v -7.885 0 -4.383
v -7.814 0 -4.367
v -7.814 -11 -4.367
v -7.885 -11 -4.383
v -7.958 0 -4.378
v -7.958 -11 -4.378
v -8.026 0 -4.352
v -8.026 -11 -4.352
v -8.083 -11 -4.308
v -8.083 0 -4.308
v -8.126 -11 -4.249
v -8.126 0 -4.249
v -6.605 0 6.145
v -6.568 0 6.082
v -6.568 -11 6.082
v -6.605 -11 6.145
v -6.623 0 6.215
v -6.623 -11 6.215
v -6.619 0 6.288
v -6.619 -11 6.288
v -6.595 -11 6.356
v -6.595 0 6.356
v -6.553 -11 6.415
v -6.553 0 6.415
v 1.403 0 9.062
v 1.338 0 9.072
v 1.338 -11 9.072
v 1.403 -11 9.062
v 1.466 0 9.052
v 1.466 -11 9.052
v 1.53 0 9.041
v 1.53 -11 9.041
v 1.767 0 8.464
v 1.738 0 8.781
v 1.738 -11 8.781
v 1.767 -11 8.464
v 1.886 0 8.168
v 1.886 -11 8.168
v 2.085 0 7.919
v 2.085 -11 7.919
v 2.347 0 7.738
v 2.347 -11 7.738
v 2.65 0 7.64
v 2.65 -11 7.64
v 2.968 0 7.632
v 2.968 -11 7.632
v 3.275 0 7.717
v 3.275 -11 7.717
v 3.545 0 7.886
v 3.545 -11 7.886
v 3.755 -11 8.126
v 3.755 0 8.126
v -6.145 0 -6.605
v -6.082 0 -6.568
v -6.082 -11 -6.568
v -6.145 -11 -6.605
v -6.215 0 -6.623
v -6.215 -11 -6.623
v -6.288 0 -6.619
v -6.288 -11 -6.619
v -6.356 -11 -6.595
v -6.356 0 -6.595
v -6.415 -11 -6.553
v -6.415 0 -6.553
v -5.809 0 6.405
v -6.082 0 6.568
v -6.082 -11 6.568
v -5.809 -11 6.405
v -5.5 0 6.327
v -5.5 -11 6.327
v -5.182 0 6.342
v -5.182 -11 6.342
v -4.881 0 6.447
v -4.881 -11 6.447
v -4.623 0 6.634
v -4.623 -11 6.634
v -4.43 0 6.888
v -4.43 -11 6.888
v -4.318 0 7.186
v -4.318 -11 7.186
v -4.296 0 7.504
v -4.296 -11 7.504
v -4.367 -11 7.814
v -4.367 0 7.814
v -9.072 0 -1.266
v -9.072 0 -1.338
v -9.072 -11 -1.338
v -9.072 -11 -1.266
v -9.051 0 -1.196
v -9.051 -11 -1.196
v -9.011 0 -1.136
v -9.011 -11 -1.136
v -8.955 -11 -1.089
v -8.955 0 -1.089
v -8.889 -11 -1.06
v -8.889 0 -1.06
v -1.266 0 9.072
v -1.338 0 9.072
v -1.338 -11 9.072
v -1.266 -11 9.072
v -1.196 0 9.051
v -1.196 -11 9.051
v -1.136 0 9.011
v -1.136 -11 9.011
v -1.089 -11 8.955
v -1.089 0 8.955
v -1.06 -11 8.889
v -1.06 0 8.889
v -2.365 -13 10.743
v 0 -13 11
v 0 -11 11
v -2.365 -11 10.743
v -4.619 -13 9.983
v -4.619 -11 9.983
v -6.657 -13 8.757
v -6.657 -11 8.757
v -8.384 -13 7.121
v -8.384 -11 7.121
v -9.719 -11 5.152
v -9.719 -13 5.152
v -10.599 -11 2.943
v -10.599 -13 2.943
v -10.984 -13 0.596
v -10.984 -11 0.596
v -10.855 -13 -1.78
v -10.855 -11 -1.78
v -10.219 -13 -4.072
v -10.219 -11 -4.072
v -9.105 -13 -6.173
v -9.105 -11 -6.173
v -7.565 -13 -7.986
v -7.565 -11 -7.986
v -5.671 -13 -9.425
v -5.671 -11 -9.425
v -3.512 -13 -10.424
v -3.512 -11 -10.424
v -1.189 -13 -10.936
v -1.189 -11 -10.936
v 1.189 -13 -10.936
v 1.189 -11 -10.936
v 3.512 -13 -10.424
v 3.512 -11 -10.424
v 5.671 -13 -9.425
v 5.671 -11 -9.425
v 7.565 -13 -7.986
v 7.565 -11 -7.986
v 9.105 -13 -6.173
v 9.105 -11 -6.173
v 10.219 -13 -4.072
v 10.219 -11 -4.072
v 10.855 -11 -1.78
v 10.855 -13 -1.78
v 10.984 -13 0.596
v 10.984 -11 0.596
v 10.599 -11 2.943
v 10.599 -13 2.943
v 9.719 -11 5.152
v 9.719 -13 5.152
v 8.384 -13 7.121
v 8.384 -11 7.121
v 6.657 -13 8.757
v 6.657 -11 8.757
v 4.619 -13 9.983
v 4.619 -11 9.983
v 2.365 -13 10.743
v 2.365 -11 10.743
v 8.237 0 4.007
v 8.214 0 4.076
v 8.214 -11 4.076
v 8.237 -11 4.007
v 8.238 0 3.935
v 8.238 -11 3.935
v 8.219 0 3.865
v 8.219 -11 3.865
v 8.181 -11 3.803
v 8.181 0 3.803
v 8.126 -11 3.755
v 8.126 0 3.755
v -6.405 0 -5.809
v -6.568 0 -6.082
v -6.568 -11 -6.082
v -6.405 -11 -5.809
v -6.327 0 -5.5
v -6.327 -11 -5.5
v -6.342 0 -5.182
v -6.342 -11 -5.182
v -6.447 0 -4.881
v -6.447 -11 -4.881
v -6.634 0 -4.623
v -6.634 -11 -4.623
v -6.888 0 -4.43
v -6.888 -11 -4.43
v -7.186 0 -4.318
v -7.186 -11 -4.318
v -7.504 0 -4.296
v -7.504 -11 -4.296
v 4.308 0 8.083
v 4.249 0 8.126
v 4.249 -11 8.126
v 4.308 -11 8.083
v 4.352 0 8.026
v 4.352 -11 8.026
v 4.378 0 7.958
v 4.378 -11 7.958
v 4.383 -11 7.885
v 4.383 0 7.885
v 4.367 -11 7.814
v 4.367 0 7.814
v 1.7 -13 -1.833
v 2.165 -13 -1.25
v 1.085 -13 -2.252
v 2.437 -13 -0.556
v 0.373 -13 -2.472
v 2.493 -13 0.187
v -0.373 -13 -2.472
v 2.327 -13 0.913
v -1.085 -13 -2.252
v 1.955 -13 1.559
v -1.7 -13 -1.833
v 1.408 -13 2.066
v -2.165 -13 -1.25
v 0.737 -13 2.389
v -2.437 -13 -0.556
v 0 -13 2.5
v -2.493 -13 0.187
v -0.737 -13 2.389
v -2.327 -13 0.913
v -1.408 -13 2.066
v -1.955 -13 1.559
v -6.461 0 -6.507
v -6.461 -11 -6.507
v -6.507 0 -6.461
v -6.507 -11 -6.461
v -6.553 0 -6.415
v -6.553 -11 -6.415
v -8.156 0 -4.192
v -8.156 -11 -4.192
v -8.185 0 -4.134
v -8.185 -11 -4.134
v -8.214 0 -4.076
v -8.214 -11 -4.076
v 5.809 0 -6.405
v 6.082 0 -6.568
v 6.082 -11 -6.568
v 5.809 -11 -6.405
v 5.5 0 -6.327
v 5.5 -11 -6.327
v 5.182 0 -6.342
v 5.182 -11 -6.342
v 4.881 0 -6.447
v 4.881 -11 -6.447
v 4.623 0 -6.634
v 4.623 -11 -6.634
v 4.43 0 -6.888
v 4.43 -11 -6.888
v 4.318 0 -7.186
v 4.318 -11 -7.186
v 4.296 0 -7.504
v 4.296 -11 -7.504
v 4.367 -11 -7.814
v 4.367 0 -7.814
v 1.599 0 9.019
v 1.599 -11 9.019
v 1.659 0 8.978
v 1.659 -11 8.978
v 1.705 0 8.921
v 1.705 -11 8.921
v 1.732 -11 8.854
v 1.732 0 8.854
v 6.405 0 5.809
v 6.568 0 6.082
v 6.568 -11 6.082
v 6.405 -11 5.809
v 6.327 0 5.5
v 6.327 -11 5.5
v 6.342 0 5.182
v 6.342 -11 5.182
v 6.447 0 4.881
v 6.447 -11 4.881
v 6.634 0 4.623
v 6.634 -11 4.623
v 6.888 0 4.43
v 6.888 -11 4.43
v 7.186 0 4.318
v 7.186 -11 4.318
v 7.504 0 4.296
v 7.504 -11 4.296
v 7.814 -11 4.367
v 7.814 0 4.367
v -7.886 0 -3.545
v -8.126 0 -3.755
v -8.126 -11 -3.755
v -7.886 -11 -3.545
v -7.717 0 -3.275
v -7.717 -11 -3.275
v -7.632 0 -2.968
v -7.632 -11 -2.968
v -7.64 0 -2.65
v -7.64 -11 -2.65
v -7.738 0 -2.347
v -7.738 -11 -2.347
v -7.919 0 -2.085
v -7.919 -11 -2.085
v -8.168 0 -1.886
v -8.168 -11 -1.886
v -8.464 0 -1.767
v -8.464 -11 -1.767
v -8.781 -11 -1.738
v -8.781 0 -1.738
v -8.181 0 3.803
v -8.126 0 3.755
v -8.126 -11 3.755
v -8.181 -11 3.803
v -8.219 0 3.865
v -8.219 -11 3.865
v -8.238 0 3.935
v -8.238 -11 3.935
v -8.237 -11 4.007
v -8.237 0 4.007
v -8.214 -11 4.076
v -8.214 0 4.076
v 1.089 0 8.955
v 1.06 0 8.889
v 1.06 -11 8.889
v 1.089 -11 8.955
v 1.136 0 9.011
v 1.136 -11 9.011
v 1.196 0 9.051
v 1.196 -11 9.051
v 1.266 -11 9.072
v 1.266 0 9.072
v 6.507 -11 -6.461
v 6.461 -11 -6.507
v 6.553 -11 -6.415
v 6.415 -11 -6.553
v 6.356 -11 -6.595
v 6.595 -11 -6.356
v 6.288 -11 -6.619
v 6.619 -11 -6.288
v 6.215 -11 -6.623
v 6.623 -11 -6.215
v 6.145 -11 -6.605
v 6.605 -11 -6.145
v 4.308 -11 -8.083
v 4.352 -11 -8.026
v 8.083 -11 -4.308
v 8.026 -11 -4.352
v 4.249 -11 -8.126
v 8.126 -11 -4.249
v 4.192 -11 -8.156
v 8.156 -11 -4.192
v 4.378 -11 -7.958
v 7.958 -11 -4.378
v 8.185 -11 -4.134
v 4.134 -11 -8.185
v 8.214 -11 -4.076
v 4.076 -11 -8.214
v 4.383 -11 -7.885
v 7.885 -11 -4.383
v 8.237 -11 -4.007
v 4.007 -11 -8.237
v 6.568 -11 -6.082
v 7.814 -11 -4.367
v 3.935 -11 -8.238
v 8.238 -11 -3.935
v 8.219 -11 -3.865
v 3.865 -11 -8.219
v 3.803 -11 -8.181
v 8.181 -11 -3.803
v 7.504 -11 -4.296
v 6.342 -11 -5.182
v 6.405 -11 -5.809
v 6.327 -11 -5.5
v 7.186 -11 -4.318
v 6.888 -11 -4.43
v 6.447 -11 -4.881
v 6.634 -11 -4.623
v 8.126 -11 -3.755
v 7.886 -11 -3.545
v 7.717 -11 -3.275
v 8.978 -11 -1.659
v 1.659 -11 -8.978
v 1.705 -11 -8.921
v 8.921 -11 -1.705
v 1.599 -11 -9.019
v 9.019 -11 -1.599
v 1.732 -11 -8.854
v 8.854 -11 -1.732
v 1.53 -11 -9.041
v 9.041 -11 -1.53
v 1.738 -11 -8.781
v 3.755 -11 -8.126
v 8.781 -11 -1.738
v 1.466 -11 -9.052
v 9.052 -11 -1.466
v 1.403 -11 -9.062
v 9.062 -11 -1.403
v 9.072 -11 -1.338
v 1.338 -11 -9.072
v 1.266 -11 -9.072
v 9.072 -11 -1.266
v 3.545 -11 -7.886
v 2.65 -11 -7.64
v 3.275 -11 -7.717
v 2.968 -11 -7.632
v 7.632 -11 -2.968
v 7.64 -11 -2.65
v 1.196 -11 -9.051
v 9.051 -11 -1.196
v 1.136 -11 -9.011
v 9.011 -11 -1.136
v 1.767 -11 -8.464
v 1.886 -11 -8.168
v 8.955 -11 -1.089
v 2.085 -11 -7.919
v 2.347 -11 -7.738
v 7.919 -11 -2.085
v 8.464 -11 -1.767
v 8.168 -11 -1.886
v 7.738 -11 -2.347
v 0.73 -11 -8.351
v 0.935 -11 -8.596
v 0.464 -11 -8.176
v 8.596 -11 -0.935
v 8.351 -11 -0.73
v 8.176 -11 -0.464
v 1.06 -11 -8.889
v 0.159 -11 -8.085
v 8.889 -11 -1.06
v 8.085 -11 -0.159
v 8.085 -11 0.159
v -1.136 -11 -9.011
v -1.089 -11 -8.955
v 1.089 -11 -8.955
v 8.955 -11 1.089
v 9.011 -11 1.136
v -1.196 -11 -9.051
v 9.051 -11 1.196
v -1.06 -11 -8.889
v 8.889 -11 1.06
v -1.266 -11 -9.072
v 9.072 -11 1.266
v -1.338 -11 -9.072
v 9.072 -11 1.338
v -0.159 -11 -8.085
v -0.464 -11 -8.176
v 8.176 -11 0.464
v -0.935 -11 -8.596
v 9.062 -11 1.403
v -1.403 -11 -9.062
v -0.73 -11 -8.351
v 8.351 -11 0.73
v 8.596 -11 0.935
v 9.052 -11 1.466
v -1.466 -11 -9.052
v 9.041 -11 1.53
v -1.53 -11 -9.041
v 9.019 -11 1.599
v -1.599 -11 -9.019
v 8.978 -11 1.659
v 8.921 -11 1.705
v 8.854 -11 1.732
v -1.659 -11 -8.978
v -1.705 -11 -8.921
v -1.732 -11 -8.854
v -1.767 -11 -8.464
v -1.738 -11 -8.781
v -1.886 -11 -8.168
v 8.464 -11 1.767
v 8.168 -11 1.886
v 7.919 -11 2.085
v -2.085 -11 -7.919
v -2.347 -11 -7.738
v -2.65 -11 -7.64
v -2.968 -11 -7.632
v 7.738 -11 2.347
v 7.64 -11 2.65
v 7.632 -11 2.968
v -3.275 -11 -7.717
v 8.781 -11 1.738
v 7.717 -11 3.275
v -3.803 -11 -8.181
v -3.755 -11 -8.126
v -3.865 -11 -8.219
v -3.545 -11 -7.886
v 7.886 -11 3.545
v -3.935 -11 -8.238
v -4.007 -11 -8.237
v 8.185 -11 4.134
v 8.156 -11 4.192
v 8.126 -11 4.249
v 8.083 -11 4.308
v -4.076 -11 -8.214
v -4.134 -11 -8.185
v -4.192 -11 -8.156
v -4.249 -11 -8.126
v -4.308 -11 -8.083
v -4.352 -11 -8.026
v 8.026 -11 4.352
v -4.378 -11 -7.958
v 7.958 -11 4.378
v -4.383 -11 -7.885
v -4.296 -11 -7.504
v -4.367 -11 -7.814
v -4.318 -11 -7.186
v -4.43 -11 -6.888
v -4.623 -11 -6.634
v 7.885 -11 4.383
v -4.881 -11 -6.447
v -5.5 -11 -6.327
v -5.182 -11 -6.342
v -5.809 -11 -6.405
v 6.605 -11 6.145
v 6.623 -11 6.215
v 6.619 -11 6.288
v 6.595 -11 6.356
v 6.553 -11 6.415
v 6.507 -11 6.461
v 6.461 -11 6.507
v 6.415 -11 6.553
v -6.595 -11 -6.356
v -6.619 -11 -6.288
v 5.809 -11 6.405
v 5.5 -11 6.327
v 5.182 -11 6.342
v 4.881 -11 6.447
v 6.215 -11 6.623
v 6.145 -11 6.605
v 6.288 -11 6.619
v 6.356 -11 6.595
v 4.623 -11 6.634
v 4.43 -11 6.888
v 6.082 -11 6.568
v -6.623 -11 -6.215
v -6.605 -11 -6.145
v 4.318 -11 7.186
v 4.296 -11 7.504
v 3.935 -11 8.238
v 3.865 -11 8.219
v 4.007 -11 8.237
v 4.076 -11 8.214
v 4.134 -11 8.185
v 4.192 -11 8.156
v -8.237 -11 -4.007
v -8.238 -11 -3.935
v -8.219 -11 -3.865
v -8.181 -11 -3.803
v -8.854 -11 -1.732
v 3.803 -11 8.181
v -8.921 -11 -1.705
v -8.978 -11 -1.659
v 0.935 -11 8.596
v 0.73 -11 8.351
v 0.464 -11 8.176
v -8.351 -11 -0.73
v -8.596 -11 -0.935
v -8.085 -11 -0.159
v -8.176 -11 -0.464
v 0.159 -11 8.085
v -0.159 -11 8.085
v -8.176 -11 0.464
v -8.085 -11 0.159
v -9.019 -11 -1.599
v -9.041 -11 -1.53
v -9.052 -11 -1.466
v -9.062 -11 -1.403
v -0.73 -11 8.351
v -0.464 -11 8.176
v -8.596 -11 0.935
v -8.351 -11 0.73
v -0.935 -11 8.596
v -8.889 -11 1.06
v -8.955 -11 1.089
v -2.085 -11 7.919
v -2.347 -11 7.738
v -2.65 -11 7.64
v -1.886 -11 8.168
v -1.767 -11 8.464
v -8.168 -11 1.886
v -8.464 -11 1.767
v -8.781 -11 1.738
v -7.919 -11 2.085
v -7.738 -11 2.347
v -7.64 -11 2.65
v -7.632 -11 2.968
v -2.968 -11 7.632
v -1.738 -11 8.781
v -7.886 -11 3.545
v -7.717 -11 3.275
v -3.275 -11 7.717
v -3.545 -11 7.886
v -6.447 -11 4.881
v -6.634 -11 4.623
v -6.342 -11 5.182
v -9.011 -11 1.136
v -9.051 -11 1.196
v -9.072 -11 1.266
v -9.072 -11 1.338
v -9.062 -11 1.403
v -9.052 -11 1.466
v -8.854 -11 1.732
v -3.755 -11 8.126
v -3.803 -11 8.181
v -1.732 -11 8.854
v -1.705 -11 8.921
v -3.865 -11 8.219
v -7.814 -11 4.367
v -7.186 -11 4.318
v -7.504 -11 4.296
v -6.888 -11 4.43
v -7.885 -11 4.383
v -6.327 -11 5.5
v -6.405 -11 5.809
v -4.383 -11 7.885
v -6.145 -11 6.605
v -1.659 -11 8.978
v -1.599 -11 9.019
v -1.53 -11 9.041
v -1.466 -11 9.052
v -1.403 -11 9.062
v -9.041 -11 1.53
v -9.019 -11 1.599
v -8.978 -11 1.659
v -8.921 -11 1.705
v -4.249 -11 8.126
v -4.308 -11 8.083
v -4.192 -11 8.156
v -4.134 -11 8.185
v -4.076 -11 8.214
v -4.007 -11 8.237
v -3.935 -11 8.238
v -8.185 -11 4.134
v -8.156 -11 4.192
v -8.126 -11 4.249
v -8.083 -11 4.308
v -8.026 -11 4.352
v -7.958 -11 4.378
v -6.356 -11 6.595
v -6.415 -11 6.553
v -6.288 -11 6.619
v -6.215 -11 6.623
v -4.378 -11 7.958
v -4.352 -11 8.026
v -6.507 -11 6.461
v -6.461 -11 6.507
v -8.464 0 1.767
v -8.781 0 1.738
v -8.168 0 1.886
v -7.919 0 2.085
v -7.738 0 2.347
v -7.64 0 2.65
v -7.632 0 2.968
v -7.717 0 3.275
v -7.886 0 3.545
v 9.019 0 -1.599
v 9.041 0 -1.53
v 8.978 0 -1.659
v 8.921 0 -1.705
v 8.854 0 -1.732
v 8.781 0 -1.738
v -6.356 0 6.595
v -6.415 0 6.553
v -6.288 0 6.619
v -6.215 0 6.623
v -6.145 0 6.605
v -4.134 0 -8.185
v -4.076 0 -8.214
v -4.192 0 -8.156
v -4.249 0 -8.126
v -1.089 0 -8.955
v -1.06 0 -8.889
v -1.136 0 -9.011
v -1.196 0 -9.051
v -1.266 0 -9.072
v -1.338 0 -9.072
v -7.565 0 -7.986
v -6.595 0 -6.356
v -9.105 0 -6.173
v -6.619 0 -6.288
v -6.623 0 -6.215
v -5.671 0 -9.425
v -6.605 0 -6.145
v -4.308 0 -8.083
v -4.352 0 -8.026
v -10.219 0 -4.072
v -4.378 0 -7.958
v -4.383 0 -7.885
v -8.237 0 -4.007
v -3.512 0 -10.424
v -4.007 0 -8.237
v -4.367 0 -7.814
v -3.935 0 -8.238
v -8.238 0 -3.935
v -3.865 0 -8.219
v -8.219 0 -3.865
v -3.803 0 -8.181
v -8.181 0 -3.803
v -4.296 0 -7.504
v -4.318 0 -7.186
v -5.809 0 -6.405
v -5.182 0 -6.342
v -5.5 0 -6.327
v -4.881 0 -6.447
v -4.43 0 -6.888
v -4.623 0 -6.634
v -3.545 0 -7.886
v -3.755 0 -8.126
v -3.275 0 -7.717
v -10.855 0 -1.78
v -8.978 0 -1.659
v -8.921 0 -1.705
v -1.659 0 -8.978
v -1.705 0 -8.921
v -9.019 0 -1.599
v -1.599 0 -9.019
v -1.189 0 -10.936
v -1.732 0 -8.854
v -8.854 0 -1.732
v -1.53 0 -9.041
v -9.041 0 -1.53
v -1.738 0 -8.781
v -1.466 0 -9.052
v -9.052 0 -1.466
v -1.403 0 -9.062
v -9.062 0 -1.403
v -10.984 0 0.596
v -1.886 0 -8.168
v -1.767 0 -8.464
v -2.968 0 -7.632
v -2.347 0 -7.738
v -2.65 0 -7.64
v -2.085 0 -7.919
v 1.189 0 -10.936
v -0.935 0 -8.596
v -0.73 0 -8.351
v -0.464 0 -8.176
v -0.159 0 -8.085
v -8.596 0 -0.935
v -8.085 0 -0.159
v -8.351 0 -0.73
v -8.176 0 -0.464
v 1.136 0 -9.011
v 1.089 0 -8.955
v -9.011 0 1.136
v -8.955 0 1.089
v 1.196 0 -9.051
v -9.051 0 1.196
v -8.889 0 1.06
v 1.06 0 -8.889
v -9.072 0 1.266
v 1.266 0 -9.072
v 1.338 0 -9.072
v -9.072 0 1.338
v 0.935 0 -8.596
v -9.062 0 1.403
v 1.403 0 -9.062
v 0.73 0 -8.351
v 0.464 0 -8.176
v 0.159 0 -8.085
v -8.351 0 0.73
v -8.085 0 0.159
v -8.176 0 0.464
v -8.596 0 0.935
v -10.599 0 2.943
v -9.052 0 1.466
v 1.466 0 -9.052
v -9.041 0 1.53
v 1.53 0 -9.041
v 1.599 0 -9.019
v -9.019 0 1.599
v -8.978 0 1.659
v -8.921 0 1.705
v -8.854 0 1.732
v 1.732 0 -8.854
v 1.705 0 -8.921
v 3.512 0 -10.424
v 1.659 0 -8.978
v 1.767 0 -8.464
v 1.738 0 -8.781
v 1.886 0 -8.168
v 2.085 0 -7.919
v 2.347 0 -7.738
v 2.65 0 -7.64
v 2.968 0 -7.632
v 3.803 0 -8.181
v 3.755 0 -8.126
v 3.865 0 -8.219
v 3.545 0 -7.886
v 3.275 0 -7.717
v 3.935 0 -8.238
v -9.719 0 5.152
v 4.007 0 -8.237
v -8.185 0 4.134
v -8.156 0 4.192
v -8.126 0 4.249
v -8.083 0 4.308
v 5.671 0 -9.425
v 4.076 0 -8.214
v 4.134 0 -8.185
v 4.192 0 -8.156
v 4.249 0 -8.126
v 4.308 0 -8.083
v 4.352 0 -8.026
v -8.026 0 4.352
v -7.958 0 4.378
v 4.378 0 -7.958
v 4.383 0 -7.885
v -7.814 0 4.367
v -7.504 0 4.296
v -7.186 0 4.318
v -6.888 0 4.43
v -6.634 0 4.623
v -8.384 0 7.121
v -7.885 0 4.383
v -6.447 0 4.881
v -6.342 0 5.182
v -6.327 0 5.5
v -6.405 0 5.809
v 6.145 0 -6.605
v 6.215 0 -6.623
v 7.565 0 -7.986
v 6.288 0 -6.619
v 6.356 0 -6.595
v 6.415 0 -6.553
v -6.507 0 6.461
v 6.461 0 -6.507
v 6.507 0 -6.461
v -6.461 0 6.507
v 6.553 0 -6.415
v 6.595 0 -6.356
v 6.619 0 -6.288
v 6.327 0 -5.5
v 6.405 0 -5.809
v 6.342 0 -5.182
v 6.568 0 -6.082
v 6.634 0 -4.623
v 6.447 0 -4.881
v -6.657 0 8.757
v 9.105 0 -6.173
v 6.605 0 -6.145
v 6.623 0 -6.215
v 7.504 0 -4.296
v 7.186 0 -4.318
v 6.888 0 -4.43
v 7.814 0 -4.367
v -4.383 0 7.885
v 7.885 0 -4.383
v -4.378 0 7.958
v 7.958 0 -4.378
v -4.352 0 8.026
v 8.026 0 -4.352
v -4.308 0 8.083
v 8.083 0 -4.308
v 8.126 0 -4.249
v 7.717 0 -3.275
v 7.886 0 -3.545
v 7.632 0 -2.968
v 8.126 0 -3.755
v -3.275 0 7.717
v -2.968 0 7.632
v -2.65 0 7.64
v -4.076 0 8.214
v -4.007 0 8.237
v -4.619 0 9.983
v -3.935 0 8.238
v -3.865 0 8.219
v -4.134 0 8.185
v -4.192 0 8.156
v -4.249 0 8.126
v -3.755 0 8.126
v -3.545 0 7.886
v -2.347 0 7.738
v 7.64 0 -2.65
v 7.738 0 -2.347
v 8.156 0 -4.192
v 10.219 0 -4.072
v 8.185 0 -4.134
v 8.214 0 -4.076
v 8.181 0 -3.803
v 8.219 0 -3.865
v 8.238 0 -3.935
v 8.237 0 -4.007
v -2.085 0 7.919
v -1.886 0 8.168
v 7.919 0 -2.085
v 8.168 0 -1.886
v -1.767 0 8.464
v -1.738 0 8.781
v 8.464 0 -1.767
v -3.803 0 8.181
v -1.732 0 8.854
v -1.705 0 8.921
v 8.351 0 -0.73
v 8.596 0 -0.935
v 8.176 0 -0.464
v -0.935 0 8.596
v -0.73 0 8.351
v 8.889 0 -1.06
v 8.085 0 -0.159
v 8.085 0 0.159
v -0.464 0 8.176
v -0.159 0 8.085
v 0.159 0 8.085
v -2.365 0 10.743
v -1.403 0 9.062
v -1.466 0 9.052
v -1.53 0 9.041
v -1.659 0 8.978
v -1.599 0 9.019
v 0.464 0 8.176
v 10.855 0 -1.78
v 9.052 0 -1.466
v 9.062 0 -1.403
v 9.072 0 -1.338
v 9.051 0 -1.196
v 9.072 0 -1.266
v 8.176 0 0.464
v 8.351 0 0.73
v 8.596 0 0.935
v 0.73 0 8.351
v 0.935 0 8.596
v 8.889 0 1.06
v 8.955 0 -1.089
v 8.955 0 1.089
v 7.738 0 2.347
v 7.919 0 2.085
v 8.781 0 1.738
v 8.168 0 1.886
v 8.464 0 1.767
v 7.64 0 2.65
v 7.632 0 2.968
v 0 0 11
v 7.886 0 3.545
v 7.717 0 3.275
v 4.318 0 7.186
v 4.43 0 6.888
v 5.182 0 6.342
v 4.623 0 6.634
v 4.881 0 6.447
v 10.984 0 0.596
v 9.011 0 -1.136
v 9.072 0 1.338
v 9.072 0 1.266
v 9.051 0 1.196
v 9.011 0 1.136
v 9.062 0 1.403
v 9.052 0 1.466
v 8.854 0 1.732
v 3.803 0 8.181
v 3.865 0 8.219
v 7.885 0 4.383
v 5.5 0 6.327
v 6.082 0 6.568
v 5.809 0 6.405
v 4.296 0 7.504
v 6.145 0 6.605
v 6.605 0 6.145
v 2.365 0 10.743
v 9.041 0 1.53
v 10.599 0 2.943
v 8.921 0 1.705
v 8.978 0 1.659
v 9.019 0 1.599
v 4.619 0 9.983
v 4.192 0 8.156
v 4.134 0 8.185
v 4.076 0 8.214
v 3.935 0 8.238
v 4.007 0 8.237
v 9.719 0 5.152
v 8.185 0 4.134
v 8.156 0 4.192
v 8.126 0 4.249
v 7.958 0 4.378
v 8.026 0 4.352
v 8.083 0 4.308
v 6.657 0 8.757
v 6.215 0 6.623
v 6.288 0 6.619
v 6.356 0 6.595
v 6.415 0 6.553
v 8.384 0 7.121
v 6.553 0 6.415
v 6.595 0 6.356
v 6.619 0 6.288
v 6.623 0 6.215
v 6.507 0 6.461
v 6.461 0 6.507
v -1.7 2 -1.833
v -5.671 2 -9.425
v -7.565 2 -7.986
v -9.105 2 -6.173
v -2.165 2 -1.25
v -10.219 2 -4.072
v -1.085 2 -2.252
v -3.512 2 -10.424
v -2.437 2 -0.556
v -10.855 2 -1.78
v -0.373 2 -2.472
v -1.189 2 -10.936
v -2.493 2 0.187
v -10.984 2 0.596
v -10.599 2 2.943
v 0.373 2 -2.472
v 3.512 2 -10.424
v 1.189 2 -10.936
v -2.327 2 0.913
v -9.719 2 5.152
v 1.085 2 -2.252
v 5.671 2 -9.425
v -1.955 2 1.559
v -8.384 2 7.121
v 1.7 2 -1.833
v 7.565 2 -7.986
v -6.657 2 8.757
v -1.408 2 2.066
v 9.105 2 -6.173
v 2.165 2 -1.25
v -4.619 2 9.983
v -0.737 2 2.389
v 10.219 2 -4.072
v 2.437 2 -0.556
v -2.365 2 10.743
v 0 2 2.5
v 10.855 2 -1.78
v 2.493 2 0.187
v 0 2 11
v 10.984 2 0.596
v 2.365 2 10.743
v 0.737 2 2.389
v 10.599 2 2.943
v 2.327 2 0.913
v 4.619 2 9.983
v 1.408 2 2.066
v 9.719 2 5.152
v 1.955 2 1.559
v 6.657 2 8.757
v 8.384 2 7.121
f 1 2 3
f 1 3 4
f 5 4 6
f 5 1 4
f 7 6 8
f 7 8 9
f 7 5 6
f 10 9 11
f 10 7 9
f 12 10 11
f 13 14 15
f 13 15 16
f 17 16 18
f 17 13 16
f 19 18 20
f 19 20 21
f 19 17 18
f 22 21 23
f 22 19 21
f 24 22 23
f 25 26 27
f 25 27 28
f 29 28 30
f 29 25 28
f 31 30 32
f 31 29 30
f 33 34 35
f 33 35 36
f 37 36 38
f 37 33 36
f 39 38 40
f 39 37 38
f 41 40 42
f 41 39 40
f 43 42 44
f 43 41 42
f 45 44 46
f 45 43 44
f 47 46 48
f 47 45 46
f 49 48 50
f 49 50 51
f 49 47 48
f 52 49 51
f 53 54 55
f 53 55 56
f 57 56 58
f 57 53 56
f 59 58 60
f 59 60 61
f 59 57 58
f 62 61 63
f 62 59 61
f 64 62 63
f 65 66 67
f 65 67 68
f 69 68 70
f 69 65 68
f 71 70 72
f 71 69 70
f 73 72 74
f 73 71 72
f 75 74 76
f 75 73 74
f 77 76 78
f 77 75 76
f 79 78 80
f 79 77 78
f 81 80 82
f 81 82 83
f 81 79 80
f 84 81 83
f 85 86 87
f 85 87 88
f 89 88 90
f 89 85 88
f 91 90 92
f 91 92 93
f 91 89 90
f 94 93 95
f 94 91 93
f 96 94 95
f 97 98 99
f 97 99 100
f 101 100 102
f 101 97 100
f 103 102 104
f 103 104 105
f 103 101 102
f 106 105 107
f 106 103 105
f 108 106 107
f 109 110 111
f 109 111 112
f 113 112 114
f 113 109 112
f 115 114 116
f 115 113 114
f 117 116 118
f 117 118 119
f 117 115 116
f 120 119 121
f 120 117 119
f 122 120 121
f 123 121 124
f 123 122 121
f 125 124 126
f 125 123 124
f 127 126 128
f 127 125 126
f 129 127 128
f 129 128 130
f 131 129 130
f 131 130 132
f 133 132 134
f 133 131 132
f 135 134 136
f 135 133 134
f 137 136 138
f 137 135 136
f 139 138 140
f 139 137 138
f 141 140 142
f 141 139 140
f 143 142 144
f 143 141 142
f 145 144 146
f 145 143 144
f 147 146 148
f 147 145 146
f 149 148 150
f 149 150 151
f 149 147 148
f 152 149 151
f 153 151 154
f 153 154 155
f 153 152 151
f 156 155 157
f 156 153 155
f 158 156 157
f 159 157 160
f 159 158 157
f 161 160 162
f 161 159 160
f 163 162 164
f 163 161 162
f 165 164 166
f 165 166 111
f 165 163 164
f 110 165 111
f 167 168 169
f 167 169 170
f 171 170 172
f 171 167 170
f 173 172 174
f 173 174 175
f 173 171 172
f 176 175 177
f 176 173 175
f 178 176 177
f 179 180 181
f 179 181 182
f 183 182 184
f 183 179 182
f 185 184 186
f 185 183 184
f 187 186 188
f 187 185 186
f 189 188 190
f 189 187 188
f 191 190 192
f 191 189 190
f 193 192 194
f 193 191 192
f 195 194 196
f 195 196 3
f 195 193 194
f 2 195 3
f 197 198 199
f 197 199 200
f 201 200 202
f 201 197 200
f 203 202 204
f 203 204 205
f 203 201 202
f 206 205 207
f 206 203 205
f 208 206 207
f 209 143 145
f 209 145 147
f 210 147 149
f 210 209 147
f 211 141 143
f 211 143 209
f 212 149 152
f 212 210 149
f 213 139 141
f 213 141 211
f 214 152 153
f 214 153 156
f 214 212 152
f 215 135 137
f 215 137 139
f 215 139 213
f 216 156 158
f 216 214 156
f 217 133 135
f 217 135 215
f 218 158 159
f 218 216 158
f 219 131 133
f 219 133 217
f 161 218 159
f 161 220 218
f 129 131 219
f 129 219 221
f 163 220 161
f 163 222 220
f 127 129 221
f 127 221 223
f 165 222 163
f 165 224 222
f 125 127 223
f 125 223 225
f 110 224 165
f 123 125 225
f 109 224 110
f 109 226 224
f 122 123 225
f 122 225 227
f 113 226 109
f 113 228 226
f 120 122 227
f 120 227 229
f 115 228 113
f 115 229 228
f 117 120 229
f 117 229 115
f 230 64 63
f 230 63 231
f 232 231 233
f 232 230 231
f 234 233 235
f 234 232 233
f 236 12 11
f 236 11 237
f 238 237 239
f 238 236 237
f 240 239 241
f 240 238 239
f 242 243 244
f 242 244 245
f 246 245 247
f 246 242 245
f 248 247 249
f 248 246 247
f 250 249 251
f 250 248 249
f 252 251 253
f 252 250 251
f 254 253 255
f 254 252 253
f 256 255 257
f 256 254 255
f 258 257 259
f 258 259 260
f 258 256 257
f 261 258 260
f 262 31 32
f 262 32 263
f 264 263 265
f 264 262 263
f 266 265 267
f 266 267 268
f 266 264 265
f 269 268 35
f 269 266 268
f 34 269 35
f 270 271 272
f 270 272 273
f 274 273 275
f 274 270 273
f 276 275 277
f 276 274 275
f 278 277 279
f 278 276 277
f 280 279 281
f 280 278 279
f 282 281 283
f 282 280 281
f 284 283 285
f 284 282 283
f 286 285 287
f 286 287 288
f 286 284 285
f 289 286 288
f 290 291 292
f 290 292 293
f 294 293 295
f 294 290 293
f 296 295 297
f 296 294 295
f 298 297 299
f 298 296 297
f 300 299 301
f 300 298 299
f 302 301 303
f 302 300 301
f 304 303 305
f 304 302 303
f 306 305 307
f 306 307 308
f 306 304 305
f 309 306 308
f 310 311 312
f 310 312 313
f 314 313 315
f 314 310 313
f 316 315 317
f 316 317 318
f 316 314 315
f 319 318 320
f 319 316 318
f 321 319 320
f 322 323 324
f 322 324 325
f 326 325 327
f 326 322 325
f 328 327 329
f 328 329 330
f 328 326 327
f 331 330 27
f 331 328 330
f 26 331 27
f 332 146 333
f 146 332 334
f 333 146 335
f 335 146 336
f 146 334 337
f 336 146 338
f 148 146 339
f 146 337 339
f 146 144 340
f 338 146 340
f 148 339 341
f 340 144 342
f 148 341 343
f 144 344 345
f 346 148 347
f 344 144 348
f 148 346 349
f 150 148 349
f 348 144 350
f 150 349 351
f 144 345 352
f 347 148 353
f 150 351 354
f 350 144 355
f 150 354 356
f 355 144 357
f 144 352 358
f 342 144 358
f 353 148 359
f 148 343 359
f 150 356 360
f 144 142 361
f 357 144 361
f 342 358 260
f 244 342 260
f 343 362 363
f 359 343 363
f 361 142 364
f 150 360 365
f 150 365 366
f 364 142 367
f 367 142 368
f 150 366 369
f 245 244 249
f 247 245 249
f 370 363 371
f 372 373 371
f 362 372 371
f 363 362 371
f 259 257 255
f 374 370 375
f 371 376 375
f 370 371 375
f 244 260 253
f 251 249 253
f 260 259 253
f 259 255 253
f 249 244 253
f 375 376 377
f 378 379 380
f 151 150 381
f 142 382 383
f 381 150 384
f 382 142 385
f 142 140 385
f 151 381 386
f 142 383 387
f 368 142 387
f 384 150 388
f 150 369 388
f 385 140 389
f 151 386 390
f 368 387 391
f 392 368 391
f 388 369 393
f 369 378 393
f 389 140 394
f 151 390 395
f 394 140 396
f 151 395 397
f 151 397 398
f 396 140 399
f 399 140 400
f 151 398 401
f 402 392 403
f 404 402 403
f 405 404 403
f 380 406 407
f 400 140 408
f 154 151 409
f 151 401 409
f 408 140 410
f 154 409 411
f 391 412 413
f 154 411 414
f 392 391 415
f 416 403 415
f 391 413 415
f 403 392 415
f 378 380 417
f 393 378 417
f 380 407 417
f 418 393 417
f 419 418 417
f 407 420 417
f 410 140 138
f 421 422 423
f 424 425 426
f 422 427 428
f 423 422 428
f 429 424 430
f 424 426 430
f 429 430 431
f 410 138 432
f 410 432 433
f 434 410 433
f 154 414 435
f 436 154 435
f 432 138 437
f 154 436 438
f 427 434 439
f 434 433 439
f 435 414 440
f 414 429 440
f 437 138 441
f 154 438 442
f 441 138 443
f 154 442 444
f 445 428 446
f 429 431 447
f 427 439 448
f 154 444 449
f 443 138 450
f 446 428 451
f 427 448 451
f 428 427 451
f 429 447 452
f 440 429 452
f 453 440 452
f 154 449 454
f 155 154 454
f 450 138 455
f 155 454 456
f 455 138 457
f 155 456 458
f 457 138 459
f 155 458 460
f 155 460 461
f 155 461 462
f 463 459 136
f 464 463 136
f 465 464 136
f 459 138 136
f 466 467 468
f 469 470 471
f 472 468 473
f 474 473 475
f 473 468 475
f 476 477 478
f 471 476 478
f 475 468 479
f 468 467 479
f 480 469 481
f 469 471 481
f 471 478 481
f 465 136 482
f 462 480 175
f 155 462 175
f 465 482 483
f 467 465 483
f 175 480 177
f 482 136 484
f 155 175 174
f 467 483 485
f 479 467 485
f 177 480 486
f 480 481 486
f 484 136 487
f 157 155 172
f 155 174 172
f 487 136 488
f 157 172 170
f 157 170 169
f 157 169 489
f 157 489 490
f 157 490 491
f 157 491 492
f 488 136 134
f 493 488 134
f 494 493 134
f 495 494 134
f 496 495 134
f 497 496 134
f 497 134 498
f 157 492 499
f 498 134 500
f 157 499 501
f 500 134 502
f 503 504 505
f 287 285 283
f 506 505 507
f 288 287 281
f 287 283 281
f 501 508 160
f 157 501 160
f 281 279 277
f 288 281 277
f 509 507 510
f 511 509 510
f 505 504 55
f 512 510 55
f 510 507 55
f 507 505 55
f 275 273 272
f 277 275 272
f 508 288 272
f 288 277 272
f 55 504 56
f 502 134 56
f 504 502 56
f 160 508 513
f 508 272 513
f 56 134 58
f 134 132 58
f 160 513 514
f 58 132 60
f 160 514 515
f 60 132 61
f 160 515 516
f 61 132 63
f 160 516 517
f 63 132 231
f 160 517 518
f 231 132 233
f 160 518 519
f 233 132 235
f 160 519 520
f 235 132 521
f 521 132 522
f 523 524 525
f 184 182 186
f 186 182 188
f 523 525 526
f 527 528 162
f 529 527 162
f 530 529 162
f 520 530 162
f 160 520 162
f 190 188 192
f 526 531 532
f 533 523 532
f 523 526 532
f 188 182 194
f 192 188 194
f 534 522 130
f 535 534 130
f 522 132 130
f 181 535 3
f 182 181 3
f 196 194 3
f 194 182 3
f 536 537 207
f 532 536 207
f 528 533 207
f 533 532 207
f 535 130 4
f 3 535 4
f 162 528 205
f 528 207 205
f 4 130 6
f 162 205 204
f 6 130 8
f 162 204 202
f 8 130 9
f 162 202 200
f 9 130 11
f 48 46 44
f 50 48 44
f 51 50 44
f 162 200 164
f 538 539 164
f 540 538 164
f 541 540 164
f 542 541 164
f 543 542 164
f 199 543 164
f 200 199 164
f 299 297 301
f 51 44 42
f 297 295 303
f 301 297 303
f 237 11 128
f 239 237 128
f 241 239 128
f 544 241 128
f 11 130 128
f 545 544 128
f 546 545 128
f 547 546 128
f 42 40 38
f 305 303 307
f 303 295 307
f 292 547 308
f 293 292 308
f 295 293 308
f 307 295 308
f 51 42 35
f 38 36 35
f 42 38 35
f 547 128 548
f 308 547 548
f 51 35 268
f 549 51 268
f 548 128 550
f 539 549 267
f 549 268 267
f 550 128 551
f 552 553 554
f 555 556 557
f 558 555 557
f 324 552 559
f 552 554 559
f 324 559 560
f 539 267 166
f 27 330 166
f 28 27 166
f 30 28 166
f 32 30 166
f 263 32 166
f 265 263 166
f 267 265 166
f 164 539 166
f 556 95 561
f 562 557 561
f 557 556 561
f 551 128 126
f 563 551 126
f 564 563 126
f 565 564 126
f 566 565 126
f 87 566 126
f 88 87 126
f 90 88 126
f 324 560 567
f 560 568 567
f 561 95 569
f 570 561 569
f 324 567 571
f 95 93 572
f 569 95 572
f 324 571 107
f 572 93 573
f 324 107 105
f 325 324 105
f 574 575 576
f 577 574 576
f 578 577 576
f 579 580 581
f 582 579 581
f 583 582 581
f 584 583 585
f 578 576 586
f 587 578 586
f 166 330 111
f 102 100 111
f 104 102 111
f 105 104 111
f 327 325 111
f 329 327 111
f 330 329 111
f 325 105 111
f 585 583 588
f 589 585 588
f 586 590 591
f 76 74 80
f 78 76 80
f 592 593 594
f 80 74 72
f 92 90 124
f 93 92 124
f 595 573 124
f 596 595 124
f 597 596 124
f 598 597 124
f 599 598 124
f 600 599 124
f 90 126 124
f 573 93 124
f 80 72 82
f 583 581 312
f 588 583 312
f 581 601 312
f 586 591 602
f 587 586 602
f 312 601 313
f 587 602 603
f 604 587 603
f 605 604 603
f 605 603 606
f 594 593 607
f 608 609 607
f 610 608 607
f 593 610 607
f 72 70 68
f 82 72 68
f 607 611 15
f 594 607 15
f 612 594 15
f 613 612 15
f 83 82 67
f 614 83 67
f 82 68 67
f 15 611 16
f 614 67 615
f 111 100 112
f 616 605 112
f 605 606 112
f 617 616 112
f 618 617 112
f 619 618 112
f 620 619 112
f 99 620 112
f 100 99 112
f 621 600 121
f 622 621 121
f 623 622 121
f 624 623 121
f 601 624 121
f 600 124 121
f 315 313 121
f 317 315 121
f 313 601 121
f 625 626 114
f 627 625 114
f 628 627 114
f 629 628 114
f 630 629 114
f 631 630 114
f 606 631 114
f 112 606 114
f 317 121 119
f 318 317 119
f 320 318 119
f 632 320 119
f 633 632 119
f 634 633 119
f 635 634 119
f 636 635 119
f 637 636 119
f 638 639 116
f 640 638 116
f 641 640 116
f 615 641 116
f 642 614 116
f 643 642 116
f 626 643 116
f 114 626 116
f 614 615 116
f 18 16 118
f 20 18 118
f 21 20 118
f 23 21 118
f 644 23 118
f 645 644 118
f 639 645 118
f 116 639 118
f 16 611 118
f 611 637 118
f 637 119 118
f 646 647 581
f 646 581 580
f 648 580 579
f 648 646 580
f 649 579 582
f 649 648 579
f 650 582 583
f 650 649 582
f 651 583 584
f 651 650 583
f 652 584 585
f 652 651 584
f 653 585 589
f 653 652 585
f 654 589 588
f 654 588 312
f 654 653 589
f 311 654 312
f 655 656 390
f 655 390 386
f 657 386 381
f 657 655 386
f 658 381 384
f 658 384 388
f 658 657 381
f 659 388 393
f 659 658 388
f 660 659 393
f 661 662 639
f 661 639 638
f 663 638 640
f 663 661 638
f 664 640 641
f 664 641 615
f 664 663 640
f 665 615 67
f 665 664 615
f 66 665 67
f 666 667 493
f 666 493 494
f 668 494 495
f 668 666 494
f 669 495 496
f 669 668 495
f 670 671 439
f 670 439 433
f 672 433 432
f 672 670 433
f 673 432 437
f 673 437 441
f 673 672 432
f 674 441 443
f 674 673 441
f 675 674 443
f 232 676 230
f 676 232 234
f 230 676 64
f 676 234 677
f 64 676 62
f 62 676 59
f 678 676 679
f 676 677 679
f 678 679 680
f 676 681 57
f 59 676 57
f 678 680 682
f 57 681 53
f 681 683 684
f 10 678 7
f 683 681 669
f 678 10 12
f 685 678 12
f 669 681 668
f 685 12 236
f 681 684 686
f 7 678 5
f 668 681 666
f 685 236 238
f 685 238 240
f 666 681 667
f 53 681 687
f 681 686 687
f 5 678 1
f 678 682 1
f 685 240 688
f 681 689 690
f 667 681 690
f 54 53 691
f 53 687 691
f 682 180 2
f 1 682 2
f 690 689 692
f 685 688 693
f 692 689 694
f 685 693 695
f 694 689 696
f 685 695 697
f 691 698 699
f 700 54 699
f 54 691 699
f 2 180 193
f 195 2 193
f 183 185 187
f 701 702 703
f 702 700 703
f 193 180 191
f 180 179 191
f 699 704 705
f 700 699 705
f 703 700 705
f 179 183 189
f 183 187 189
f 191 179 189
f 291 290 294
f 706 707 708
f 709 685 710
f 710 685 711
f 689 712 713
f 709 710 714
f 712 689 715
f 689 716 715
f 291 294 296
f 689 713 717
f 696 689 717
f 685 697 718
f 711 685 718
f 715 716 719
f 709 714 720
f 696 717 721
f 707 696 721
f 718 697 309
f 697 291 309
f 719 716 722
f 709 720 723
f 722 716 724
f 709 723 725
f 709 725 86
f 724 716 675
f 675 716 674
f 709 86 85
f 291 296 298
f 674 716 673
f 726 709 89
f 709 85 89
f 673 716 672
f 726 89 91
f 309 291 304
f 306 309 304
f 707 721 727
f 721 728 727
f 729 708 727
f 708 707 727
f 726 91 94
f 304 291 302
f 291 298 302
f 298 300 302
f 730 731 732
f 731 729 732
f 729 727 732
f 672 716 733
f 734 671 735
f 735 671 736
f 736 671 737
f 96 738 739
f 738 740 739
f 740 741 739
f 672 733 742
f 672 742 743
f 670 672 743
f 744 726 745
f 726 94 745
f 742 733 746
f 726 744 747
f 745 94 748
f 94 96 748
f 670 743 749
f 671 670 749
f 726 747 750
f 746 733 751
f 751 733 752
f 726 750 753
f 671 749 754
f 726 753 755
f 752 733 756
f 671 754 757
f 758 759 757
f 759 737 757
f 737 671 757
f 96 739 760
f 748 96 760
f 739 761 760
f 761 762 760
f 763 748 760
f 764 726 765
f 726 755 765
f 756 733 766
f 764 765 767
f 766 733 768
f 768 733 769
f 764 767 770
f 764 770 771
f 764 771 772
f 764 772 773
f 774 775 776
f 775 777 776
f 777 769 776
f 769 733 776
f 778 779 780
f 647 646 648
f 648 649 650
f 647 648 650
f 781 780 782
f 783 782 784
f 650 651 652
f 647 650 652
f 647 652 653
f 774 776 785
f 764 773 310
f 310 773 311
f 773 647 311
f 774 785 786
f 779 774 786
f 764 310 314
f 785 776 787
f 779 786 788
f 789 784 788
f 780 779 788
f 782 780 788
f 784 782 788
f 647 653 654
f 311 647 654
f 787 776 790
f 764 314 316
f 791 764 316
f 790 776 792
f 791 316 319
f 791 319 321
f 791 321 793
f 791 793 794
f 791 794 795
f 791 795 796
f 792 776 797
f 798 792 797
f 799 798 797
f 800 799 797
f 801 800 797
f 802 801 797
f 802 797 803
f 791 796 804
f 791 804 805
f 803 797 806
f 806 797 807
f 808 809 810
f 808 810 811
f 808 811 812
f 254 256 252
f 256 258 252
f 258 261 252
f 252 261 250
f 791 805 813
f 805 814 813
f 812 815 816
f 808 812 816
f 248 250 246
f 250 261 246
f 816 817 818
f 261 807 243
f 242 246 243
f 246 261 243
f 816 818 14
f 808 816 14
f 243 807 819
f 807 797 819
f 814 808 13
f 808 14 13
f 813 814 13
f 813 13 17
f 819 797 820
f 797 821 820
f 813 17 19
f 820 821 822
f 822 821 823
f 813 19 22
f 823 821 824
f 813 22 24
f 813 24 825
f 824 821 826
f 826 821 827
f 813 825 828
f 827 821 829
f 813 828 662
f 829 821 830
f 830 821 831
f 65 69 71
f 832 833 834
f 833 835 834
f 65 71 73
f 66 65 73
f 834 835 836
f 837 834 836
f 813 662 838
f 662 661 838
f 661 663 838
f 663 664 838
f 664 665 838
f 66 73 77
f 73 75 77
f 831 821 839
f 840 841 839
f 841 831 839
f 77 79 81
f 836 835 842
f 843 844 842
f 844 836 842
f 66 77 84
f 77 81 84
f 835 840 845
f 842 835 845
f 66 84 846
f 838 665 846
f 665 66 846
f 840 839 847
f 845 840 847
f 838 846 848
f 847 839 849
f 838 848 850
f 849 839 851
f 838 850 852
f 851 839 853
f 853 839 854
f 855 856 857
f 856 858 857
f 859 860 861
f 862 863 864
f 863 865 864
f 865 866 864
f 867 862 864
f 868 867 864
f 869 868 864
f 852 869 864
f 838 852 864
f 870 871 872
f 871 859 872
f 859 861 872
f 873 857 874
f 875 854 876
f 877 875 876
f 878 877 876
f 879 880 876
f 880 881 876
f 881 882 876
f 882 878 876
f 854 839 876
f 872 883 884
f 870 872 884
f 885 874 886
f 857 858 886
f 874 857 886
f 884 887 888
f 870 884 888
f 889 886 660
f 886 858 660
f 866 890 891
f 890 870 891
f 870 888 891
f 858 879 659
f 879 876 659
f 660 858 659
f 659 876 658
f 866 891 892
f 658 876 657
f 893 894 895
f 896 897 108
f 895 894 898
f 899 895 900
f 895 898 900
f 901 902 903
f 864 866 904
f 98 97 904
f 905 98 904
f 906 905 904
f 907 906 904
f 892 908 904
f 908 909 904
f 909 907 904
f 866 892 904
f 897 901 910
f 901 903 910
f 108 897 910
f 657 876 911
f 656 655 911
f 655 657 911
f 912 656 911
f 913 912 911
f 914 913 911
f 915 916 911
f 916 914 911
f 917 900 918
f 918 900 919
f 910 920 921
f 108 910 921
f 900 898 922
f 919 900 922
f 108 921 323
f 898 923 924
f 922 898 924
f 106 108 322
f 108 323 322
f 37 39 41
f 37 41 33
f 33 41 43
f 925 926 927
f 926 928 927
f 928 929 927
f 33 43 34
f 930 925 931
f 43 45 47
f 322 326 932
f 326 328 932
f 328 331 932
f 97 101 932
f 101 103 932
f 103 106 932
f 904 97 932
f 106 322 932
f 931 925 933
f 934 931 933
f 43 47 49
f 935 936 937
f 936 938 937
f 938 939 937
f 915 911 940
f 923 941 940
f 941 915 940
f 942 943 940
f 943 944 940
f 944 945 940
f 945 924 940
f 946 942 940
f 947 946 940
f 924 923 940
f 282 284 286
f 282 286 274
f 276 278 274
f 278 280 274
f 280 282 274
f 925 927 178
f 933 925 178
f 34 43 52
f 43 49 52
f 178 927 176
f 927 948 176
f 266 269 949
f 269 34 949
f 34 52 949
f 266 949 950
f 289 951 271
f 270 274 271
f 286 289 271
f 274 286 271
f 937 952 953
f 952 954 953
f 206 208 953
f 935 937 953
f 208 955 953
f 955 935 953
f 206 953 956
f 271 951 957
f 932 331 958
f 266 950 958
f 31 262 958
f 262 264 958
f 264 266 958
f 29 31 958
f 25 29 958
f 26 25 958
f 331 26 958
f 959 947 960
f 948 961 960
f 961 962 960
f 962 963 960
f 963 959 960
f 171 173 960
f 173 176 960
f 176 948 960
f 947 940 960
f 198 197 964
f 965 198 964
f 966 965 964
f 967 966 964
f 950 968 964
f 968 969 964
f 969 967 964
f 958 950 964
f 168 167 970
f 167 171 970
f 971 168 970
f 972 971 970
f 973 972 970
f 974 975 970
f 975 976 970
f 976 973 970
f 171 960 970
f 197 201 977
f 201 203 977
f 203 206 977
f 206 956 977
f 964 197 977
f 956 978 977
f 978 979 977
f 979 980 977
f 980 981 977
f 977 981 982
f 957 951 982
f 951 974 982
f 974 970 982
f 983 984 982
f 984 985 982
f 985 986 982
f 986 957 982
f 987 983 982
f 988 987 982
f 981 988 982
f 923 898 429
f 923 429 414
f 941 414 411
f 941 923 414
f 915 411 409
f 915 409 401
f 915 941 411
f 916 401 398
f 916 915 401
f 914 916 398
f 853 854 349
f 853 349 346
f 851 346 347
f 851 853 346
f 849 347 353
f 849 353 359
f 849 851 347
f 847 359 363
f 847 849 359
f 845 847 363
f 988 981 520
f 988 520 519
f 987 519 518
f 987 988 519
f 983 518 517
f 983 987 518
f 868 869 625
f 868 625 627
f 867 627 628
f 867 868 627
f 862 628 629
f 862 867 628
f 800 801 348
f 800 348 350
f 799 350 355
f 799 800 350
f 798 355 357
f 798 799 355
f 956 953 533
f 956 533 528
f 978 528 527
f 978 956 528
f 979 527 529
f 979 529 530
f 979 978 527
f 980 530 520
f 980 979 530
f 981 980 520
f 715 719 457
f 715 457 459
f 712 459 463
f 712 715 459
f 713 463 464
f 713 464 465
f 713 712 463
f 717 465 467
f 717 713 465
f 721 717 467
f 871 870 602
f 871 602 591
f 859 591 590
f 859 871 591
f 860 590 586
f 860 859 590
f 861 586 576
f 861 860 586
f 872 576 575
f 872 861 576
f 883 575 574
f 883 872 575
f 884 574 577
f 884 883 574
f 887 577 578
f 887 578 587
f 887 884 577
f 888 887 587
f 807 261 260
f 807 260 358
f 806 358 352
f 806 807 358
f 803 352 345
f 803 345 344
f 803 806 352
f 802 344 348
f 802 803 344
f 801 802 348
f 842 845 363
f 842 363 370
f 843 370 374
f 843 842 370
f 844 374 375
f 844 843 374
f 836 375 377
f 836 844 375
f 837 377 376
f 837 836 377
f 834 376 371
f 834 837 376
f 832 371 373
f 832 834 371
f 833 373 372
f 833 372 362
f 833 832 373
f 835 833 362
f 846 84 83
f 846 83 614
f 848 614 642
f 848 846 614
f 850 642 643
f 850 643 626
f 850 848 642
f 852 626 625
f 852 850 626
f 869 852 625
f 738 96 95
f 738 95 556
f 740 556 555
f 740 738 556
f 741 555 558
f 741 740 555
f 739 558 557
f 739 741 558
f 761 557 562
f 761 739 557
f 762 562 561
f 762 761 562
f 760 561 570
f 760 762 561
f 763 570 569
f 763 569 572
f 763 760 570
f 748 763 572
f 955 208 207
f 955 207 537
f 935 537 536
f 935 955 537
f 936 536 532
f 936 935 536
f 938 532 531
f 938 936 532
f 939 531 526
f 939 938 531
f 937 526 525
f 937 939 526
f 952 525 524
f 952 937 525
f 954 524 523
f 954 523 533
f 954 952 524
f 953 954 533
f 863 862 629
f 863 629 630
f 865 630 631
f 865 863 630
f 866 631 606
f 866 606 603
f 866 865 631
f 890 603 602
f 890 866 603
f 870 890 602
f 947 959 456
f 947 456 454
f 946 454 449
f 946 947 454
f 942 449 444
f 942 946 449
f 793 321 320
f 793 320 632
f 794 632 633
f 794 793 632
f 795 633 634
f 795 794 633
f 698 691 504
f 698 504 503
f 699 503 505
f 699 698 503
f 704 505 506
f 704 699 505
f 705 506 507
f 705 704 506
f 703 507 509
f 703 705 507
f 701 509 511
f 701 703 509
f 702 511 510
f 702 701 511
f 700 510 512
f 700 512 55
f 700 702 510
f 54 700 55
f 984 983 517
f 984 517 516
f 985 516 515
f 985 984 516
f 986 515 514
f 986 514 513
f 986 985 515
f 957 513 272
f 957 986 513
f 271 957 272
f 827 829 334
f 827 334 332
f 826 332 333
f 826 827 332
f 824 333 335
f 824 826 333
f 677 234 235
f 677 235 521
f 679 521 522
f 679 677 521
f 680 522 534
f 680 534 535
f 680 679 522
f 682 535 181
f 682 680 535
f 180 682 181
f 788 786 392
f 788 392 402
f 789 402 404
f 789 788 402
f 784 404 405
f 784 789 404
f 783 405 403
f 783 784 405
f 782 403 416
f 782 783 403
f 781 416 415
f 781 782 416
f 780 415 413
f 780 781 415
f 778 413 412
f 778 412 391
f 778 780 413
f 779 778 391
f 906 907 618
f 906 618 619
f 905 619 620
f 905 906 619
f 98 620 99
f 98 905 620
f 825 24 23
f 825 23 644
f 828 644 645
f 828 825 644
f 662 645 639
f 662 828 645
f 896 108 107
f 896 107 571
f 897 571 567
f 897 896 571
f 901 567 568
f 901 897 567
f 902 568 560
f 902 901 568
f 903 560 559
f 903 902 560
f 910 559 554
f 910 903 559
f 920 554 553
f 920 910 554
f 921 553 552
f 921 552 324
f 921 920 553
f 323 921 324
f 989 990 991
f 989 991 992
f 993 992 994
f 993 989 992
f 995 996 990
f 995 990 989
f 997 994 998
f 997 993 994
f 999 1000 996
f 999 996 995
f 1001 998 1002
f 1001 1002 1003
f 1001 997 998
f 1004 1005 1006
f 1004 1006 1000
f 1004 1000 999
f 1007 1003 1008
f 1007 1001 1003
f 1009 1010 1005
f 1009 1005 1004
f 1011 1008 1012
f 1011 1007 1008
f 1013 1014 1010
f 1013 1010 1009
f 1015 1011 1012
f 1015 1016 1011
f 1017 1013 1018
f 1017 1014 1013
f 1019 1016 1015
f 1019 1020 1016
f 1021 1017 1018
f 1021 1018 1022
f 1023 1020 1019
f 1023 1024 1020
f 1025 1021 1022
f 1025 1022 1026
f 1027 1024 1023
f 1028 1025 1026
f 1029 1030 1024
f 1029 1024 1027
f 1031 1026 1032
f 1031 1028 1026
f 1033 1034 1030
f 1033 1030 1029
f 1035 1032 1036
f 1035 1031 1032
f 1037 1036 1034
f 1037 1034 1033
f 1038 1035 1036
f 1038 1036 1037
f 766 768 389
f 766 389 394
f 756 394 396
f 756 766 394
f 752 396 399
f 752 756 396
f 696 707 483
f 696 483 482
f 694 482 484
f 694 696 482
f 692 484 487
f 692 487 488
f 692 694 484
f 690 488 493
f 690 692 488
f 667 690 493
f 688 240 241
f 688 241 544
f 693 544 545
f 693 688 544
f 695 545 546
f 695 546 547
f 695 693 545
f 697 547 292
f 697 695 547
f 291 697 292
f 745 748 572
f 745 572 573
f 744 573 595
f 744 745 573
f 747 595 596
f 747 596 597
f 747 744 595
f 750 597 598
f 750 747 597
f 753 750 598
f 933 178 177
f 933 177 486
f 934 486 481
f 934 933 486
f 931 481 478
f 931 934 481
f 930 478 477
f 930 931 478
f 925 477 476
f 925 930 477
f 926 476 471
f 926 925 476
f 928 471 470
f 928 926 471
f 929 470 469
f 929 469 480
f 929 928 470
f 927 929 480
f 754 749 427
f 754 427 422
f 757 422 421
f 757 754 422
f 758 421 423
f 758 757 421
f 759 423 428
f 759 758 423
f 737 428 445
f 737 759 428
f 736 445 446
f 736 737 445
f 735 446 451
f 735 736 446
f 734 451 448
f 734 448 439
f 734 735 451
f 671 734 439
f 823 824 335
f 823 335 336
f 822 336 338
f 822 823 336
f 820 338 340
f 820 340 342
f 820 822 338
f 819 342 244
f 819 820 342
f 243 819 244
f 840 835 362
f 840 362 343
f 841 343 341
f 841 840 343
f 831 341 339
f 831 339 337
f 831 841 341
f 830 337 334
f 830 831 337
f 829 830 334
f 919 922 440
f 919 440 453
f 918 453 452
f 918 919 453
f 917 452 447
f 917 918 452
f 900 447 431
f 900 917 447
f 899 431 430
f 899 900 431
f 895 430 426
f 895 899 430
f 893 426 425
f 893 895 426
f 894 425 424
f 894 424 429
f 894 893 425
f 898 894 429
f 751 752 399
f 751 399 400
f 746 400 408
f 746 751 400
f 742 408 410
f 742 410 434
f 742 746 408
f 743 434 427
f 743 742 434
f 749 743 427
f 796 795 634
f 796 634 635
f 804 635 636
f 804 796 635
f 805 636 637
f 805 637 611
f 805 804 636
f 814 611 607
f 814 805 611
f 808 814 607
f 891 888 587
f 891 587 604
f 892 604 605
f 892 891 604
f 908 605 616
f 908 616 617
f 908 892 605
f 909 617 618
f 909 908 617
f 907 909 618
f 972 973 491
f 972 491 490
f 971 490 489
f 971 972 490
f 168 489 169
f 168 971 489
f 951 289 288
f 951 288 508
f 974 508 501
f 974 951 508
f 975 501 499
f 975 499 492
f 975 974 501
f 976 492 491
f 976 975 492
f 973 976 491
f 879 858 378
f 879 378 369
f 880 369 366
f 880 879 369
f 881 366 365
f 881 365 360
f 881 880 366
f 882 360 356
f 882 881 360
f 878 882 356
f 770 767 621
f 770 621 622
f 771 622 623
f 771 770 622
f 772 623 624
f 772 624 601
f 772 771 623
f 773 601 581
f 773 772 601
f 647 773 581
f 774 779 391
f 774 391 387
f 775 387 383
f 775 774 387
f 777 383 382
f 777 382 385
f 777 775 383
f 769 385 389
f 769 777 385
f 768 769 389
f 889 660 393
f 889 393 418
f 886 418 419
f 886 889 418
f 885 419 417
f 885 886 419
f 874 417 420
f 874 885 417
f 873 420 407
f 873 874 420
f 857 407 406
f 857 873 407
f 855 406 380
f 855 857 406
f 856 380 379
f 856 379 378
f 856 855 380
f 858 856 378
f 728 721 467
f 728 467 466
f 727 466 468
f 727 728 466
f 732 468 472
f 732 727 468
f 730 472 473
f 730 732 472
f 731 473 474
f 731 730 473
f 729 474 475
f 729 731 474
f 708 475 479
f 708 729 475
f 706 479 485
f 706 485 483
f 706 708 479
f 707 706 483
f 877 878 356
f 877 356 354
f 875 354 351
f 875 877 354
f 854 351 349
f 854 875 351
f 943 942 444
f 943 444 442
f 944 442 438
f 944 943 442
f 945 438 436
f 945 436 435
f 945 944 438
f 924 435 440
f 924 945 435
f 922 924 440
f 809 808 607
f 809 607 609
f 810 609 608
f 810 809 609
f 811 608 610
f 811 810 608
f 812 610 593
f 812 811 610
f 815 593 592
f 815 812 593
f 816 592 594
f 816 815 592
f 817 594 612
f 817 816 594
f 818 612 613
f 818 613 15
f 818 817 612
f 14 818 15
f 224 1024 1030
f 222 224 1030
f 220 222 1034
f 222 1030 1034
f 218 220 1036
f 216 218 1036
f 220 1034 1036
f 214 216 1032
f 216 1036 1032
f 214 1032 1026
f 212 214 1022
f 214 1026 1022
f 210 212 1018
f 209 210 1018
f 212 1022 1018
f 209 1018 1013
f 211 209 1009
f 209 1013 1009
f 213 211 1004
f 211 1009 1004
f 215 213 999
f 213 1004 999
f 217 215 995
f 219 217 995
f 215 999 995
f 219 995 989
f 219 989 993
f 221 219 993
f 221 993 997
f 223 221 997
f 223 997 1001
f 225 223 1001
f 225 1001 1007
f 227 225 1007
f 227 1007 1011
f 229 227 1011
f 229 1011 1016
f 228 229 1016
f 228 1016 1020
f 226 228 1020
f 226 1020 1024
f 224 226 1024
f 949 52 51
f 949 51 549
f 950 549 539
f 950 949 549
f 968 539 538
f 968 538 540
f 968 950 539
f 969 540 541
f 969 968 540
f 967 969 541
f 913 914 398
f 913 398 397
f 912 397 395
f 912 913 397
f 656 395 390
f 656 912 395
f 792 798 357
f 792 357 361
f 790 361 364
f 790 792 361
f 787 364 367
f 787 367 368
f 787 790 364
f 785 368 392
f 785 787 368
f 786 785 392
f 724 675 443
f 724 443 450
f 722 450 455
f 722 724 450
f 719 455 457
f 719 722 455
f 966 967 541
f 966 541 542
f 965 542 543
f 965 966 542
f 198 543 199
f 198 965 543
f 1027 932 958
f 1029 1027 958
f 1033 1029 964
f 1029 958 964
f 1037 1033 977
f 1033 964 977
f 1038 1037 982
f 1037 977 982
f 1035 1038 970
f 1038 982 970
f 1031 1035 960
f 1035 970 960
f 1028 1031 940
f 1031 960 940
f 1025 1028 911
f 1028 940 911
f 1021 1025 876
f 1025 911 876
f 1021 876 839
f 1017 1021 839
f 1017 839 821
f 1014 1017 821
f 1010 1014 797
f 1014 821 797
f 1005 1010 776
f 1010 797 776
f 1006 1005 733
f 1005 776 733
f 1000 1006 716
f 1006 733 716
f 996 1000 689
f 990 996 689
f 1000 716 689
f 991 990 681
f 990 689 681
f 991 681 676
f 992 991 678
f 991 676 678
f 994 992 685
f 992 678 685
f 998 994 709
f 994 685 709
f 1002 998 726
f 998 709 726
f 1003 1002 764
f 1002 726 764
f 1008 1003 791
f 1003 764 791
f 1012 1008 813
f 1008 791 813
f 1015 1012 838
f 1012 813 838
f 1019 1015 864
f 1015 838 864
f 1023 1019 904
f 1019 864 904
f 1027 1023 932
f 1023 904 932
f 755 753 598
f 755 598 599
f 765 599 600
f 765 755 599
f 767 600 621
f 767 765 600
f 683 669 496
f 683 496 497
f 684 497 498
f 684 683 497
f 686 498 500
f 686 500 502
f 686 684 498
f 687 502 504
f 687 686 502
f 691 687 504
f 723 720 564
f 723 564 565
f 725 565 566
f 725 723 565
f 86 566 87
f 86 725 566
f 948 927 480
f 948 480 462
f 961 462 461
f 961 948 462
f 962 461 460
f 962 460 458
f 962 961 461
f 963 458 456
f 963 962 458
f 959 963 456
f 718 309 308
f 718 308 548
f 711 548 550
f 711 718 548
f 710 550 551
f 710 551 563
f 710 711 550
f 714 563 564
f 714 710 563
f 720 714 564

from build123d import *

# Parameters (mm, degrees)
SKETCH_1_R               = 9.17
EXTRUDE_1_DEPTH          = 11
CUT_EXTRUDE_1_DEPTH      = 11
PATTERN_CIRCULAR_1_COUNT = 20
SKETCH_4_R               = 11
EXTRUDE_3_DEPTH          = 2
EXTRUDE_START            = 2
SKETCH_3_R               = 11
EXTRUDE_4_DEPTH          = 2
SKETCH_5_R               = 2.5
CUT_EXTRUDE_2_DEPTH      = 22


with BuildPart() as part:
    # 草图1 → 凸台-拉伸1 (new body)
    with BuildSketch(Plane(origin=(0, 0, 0), x_dir=(1, 0, 0), z_dir=(0, 1, 0))):
        with Locations(Location((0, 0, 0), (0, 0, 270))):
            Circle(SKETCH_1_R)
    extrude(amount=-EXTRUDE_1_DEPTH)

    # 草图2 → 切除-拉伸1 (cut)
    with BuildSketch(Plane(origin=(0, 0, 0), x_dir=(1, 0, 0), z_dir=(0, 1, 0))):
        with BuildLine():
            Line((-1.338469592, 9.071791397), (-1.301979145, 9.548134799))
            Line((-1.301979145, 9.548134799), (1.164461041, 9.508969944))
            Line((1.164461041, 9.508969944), (1.338469592, 9.071791397))
            ThreePointArc((1.338469592, 9.071791397), (1.164461041, 9.03324808), (1.06034373, 8.888596261))
            ThreePointArc((1.06034373, 8.888596261), (0, 8.072950826), (-1.06034373, 8.888596261))
            ThreePointArc((-1.06034373, 8.888596261), (-1.164461041, 9.03324808), (-1.338469592, 9.071791397))
        make_face()
    cut_extrude_1 = extrude(amount=-CUT_EXTRUDE_1_DEPTH, mode=Mode.SUBTRACT)

    # 阵列(圆周)1: 切除-拉伸1 ×20 about axis
    pattern_circular_1_axis = Axis((0, 0, 0), (0, 1, 0))
    for i in range(1, PATTERN_CIRCULAR_1_COUNT):
        add(cut_extrude_1.rotate(pattern_circular_1_axis, i * 360 / PATTERN_CIRCULAR_1_COUNT), mode=Mode.SUBTRACT)

    # 草图4 → 凸台-拉伸3 (add)
    with BuildSketch(Plane(origin=(0, 0, 0), x_dir=(1, 0, 0), z_dir=(0, 1, 0))):
        with Locations(Location((0, 0, 0), (0, 0, 270))):
            Circle(SKETCH_4_R)
    extrude(amount=EXTRUDE_3_DEPTH)

    # 草图3 → 凸台-拉伸4 (add)
    with BuildSketch(Plane.XZ.offset(11).offset(EXTRUDE_START)):
        with Locations(Location((0, 0, 0), (0, 0, 90))):
            Circle(SKETCH_3_R)
    extrude(amount=-EXTRUDE_4_DEPTH)

    # 草图5 → 切除-拉伸2 (cut)
    with BuildSketch(Plane(origin=(0, 2, 0), x_dir=(1, 0, 0), z_dir=(0, 1, 0))):
        with Locations(Location((0, 0, 0), (0, 0, 270))):
            Circle(SKETCH_5_R)
    extrude(amount=-CUT_EXTRUDE_2_DEPTH, mode=Mode.SUBTRACT)


solid = part.part
